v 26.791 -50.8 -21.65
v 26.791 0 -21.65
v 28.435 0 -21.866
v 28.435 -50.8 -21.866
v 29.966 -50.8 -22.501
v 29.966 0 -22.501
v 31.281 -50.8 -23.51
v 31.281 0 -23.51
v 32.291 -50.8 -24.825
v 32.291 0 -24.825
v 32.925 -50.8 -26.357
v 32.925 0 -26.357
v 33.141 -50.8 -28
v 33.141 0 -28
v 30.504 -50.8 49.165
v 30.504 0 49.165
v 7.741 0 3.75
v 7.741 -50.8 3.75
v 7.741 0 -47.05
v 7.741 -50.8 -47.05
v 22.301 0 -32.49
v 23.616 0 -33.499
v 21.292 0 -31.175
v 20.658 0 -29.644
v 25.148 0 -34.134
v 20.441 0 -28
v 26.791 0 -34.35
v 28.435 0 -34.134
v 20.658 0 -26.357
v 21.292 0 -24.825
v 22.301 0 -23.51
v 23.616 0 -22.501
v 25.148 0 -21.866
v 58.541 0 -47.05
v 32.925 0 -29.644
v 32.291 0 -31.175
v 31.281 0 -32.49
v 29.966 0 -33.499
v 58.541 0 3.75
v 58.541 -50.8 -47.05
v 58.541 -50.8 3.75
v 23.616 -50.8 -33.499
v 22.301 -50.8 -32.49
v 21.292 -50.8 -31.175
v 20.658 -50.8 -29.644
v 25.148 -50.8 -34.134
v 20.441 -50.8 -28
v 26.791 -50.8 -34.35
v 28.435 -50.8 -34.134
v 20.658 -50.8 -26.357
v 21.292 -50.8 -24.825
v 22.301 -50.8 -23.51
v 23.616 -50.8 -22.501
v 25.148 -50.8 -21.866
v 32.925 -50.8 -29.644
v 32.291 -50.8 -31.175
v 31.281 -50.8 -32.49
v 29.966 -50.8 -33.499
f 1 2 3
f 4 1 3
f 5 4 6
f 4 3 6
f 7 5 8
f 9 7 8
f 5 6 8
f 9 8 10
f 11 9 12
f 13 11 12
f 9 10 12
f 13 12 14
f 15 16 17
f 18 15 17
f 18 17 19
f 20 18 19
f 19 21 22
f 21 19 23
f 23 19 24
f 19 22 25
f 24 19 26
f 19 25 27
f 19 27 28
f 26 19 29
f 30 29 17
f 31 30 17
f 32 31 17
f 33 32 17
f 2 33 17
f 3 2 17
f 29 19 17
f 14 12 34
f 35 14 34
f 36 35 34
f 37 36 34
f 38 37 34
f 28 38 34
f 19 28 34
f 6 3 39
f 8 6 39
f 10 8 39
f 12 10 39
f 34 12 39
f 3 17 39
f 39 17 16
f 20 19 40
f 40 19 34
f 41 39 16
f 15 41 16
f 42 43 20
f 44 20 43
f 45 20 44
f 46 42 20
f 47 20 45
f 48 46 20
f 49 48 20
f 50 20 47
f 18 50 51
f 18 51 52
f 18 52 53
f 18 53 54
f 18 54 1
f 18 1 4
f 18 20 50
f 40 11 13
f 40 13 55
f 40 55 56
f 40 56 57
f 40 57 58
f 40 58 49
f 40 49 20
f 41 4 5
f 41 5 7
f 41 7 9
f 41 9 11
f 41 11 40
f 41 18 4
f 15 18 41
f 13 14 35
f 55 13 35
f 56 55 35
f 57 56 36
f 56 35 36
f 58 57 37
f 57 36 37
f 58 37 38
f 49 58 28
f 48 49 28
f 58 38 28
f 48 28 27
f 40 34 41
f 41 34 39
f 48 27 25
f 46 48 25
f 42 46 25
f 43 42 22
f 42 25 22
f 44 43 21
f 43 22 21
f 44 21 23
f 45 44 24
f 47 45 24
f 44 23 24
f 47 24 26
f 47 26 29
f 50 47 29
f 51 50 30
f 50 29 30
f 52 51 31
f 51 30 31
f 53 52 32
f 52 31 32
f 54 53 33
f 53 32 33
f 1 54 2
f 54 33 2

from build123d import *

# Parameters (mm, degrees)
F1_DEPTH = 50.8


with BuildPart() as f1:
    # F0 (on Front) → F1 (new body)
    with BuildSketch(Plane.XZ):
        with BuildLine():
            Line((58.541361, 3.749926), (26.791361, 3.749926))
            Line((26.791361, 3.749926), (26.791361, -21.650074))
            ThreePointArc((26.791361, -21.650074), (31.281489, -23.509946), (33.141361, -28.000074))
            Line((33.141361, -28.000074), (58.541361, -28.000074))
            Line((58.541361, -28.000074), (58.541361, 3.749926))
        make_face()
        with BuildLine():
            Line((26.791361, 3.749926), (7.741361, 3.749926))
            Line((7.741361, 3.749926), (7.741361, -28.000074))
            Line((7.741361, -28.000074), (20.441361, -28.000074))
            ThreePointArc((20.441361, -28.000074), (22.301233, -23.509946), (26.791361, -21.650074))
            Line((26.791361, -21.650074), (26.791361, 3.749926))
        make_face()
        with BuildLine():
            Line((20.441361, -28.000074), (7.741361, -28.000074))
            Line((7.741361, -28.000074), (7.741361, -47.050074))
            Line((7.741361, -47.050074), (26.791361, -47.050074))
            Line((26.791361, -47.050074), (26.791361, -34.350074))
            ThreePointArc((26.791361, -34.350074), (22.301233, -32.490202), (20.441361, -28.000074))
        make_face()
        with BuildLine():
            Line((58.541361, -47.050074), (58.541361, -28.000074))
            Line((58.541361, -28.000074), (33.141361, -28.000074))
            ThreePointArc((33.141361, -28.000074), (31.281489, -32.490202), (26.791361, -34.350074))
            Line((26.791361, -34.350074), (26.791361, -47.050074))
            Line((26.791361, -47.050074), (58.541361, -47.050074))
        make_face()
        Polygon((30.503648, 49.164883), (7.741361, 3.749926), (26.791361, 3.749926), (58.541361, 3.749926), align=None)
    extrude(amount=F1_DEPTH)


solid = f1.part
